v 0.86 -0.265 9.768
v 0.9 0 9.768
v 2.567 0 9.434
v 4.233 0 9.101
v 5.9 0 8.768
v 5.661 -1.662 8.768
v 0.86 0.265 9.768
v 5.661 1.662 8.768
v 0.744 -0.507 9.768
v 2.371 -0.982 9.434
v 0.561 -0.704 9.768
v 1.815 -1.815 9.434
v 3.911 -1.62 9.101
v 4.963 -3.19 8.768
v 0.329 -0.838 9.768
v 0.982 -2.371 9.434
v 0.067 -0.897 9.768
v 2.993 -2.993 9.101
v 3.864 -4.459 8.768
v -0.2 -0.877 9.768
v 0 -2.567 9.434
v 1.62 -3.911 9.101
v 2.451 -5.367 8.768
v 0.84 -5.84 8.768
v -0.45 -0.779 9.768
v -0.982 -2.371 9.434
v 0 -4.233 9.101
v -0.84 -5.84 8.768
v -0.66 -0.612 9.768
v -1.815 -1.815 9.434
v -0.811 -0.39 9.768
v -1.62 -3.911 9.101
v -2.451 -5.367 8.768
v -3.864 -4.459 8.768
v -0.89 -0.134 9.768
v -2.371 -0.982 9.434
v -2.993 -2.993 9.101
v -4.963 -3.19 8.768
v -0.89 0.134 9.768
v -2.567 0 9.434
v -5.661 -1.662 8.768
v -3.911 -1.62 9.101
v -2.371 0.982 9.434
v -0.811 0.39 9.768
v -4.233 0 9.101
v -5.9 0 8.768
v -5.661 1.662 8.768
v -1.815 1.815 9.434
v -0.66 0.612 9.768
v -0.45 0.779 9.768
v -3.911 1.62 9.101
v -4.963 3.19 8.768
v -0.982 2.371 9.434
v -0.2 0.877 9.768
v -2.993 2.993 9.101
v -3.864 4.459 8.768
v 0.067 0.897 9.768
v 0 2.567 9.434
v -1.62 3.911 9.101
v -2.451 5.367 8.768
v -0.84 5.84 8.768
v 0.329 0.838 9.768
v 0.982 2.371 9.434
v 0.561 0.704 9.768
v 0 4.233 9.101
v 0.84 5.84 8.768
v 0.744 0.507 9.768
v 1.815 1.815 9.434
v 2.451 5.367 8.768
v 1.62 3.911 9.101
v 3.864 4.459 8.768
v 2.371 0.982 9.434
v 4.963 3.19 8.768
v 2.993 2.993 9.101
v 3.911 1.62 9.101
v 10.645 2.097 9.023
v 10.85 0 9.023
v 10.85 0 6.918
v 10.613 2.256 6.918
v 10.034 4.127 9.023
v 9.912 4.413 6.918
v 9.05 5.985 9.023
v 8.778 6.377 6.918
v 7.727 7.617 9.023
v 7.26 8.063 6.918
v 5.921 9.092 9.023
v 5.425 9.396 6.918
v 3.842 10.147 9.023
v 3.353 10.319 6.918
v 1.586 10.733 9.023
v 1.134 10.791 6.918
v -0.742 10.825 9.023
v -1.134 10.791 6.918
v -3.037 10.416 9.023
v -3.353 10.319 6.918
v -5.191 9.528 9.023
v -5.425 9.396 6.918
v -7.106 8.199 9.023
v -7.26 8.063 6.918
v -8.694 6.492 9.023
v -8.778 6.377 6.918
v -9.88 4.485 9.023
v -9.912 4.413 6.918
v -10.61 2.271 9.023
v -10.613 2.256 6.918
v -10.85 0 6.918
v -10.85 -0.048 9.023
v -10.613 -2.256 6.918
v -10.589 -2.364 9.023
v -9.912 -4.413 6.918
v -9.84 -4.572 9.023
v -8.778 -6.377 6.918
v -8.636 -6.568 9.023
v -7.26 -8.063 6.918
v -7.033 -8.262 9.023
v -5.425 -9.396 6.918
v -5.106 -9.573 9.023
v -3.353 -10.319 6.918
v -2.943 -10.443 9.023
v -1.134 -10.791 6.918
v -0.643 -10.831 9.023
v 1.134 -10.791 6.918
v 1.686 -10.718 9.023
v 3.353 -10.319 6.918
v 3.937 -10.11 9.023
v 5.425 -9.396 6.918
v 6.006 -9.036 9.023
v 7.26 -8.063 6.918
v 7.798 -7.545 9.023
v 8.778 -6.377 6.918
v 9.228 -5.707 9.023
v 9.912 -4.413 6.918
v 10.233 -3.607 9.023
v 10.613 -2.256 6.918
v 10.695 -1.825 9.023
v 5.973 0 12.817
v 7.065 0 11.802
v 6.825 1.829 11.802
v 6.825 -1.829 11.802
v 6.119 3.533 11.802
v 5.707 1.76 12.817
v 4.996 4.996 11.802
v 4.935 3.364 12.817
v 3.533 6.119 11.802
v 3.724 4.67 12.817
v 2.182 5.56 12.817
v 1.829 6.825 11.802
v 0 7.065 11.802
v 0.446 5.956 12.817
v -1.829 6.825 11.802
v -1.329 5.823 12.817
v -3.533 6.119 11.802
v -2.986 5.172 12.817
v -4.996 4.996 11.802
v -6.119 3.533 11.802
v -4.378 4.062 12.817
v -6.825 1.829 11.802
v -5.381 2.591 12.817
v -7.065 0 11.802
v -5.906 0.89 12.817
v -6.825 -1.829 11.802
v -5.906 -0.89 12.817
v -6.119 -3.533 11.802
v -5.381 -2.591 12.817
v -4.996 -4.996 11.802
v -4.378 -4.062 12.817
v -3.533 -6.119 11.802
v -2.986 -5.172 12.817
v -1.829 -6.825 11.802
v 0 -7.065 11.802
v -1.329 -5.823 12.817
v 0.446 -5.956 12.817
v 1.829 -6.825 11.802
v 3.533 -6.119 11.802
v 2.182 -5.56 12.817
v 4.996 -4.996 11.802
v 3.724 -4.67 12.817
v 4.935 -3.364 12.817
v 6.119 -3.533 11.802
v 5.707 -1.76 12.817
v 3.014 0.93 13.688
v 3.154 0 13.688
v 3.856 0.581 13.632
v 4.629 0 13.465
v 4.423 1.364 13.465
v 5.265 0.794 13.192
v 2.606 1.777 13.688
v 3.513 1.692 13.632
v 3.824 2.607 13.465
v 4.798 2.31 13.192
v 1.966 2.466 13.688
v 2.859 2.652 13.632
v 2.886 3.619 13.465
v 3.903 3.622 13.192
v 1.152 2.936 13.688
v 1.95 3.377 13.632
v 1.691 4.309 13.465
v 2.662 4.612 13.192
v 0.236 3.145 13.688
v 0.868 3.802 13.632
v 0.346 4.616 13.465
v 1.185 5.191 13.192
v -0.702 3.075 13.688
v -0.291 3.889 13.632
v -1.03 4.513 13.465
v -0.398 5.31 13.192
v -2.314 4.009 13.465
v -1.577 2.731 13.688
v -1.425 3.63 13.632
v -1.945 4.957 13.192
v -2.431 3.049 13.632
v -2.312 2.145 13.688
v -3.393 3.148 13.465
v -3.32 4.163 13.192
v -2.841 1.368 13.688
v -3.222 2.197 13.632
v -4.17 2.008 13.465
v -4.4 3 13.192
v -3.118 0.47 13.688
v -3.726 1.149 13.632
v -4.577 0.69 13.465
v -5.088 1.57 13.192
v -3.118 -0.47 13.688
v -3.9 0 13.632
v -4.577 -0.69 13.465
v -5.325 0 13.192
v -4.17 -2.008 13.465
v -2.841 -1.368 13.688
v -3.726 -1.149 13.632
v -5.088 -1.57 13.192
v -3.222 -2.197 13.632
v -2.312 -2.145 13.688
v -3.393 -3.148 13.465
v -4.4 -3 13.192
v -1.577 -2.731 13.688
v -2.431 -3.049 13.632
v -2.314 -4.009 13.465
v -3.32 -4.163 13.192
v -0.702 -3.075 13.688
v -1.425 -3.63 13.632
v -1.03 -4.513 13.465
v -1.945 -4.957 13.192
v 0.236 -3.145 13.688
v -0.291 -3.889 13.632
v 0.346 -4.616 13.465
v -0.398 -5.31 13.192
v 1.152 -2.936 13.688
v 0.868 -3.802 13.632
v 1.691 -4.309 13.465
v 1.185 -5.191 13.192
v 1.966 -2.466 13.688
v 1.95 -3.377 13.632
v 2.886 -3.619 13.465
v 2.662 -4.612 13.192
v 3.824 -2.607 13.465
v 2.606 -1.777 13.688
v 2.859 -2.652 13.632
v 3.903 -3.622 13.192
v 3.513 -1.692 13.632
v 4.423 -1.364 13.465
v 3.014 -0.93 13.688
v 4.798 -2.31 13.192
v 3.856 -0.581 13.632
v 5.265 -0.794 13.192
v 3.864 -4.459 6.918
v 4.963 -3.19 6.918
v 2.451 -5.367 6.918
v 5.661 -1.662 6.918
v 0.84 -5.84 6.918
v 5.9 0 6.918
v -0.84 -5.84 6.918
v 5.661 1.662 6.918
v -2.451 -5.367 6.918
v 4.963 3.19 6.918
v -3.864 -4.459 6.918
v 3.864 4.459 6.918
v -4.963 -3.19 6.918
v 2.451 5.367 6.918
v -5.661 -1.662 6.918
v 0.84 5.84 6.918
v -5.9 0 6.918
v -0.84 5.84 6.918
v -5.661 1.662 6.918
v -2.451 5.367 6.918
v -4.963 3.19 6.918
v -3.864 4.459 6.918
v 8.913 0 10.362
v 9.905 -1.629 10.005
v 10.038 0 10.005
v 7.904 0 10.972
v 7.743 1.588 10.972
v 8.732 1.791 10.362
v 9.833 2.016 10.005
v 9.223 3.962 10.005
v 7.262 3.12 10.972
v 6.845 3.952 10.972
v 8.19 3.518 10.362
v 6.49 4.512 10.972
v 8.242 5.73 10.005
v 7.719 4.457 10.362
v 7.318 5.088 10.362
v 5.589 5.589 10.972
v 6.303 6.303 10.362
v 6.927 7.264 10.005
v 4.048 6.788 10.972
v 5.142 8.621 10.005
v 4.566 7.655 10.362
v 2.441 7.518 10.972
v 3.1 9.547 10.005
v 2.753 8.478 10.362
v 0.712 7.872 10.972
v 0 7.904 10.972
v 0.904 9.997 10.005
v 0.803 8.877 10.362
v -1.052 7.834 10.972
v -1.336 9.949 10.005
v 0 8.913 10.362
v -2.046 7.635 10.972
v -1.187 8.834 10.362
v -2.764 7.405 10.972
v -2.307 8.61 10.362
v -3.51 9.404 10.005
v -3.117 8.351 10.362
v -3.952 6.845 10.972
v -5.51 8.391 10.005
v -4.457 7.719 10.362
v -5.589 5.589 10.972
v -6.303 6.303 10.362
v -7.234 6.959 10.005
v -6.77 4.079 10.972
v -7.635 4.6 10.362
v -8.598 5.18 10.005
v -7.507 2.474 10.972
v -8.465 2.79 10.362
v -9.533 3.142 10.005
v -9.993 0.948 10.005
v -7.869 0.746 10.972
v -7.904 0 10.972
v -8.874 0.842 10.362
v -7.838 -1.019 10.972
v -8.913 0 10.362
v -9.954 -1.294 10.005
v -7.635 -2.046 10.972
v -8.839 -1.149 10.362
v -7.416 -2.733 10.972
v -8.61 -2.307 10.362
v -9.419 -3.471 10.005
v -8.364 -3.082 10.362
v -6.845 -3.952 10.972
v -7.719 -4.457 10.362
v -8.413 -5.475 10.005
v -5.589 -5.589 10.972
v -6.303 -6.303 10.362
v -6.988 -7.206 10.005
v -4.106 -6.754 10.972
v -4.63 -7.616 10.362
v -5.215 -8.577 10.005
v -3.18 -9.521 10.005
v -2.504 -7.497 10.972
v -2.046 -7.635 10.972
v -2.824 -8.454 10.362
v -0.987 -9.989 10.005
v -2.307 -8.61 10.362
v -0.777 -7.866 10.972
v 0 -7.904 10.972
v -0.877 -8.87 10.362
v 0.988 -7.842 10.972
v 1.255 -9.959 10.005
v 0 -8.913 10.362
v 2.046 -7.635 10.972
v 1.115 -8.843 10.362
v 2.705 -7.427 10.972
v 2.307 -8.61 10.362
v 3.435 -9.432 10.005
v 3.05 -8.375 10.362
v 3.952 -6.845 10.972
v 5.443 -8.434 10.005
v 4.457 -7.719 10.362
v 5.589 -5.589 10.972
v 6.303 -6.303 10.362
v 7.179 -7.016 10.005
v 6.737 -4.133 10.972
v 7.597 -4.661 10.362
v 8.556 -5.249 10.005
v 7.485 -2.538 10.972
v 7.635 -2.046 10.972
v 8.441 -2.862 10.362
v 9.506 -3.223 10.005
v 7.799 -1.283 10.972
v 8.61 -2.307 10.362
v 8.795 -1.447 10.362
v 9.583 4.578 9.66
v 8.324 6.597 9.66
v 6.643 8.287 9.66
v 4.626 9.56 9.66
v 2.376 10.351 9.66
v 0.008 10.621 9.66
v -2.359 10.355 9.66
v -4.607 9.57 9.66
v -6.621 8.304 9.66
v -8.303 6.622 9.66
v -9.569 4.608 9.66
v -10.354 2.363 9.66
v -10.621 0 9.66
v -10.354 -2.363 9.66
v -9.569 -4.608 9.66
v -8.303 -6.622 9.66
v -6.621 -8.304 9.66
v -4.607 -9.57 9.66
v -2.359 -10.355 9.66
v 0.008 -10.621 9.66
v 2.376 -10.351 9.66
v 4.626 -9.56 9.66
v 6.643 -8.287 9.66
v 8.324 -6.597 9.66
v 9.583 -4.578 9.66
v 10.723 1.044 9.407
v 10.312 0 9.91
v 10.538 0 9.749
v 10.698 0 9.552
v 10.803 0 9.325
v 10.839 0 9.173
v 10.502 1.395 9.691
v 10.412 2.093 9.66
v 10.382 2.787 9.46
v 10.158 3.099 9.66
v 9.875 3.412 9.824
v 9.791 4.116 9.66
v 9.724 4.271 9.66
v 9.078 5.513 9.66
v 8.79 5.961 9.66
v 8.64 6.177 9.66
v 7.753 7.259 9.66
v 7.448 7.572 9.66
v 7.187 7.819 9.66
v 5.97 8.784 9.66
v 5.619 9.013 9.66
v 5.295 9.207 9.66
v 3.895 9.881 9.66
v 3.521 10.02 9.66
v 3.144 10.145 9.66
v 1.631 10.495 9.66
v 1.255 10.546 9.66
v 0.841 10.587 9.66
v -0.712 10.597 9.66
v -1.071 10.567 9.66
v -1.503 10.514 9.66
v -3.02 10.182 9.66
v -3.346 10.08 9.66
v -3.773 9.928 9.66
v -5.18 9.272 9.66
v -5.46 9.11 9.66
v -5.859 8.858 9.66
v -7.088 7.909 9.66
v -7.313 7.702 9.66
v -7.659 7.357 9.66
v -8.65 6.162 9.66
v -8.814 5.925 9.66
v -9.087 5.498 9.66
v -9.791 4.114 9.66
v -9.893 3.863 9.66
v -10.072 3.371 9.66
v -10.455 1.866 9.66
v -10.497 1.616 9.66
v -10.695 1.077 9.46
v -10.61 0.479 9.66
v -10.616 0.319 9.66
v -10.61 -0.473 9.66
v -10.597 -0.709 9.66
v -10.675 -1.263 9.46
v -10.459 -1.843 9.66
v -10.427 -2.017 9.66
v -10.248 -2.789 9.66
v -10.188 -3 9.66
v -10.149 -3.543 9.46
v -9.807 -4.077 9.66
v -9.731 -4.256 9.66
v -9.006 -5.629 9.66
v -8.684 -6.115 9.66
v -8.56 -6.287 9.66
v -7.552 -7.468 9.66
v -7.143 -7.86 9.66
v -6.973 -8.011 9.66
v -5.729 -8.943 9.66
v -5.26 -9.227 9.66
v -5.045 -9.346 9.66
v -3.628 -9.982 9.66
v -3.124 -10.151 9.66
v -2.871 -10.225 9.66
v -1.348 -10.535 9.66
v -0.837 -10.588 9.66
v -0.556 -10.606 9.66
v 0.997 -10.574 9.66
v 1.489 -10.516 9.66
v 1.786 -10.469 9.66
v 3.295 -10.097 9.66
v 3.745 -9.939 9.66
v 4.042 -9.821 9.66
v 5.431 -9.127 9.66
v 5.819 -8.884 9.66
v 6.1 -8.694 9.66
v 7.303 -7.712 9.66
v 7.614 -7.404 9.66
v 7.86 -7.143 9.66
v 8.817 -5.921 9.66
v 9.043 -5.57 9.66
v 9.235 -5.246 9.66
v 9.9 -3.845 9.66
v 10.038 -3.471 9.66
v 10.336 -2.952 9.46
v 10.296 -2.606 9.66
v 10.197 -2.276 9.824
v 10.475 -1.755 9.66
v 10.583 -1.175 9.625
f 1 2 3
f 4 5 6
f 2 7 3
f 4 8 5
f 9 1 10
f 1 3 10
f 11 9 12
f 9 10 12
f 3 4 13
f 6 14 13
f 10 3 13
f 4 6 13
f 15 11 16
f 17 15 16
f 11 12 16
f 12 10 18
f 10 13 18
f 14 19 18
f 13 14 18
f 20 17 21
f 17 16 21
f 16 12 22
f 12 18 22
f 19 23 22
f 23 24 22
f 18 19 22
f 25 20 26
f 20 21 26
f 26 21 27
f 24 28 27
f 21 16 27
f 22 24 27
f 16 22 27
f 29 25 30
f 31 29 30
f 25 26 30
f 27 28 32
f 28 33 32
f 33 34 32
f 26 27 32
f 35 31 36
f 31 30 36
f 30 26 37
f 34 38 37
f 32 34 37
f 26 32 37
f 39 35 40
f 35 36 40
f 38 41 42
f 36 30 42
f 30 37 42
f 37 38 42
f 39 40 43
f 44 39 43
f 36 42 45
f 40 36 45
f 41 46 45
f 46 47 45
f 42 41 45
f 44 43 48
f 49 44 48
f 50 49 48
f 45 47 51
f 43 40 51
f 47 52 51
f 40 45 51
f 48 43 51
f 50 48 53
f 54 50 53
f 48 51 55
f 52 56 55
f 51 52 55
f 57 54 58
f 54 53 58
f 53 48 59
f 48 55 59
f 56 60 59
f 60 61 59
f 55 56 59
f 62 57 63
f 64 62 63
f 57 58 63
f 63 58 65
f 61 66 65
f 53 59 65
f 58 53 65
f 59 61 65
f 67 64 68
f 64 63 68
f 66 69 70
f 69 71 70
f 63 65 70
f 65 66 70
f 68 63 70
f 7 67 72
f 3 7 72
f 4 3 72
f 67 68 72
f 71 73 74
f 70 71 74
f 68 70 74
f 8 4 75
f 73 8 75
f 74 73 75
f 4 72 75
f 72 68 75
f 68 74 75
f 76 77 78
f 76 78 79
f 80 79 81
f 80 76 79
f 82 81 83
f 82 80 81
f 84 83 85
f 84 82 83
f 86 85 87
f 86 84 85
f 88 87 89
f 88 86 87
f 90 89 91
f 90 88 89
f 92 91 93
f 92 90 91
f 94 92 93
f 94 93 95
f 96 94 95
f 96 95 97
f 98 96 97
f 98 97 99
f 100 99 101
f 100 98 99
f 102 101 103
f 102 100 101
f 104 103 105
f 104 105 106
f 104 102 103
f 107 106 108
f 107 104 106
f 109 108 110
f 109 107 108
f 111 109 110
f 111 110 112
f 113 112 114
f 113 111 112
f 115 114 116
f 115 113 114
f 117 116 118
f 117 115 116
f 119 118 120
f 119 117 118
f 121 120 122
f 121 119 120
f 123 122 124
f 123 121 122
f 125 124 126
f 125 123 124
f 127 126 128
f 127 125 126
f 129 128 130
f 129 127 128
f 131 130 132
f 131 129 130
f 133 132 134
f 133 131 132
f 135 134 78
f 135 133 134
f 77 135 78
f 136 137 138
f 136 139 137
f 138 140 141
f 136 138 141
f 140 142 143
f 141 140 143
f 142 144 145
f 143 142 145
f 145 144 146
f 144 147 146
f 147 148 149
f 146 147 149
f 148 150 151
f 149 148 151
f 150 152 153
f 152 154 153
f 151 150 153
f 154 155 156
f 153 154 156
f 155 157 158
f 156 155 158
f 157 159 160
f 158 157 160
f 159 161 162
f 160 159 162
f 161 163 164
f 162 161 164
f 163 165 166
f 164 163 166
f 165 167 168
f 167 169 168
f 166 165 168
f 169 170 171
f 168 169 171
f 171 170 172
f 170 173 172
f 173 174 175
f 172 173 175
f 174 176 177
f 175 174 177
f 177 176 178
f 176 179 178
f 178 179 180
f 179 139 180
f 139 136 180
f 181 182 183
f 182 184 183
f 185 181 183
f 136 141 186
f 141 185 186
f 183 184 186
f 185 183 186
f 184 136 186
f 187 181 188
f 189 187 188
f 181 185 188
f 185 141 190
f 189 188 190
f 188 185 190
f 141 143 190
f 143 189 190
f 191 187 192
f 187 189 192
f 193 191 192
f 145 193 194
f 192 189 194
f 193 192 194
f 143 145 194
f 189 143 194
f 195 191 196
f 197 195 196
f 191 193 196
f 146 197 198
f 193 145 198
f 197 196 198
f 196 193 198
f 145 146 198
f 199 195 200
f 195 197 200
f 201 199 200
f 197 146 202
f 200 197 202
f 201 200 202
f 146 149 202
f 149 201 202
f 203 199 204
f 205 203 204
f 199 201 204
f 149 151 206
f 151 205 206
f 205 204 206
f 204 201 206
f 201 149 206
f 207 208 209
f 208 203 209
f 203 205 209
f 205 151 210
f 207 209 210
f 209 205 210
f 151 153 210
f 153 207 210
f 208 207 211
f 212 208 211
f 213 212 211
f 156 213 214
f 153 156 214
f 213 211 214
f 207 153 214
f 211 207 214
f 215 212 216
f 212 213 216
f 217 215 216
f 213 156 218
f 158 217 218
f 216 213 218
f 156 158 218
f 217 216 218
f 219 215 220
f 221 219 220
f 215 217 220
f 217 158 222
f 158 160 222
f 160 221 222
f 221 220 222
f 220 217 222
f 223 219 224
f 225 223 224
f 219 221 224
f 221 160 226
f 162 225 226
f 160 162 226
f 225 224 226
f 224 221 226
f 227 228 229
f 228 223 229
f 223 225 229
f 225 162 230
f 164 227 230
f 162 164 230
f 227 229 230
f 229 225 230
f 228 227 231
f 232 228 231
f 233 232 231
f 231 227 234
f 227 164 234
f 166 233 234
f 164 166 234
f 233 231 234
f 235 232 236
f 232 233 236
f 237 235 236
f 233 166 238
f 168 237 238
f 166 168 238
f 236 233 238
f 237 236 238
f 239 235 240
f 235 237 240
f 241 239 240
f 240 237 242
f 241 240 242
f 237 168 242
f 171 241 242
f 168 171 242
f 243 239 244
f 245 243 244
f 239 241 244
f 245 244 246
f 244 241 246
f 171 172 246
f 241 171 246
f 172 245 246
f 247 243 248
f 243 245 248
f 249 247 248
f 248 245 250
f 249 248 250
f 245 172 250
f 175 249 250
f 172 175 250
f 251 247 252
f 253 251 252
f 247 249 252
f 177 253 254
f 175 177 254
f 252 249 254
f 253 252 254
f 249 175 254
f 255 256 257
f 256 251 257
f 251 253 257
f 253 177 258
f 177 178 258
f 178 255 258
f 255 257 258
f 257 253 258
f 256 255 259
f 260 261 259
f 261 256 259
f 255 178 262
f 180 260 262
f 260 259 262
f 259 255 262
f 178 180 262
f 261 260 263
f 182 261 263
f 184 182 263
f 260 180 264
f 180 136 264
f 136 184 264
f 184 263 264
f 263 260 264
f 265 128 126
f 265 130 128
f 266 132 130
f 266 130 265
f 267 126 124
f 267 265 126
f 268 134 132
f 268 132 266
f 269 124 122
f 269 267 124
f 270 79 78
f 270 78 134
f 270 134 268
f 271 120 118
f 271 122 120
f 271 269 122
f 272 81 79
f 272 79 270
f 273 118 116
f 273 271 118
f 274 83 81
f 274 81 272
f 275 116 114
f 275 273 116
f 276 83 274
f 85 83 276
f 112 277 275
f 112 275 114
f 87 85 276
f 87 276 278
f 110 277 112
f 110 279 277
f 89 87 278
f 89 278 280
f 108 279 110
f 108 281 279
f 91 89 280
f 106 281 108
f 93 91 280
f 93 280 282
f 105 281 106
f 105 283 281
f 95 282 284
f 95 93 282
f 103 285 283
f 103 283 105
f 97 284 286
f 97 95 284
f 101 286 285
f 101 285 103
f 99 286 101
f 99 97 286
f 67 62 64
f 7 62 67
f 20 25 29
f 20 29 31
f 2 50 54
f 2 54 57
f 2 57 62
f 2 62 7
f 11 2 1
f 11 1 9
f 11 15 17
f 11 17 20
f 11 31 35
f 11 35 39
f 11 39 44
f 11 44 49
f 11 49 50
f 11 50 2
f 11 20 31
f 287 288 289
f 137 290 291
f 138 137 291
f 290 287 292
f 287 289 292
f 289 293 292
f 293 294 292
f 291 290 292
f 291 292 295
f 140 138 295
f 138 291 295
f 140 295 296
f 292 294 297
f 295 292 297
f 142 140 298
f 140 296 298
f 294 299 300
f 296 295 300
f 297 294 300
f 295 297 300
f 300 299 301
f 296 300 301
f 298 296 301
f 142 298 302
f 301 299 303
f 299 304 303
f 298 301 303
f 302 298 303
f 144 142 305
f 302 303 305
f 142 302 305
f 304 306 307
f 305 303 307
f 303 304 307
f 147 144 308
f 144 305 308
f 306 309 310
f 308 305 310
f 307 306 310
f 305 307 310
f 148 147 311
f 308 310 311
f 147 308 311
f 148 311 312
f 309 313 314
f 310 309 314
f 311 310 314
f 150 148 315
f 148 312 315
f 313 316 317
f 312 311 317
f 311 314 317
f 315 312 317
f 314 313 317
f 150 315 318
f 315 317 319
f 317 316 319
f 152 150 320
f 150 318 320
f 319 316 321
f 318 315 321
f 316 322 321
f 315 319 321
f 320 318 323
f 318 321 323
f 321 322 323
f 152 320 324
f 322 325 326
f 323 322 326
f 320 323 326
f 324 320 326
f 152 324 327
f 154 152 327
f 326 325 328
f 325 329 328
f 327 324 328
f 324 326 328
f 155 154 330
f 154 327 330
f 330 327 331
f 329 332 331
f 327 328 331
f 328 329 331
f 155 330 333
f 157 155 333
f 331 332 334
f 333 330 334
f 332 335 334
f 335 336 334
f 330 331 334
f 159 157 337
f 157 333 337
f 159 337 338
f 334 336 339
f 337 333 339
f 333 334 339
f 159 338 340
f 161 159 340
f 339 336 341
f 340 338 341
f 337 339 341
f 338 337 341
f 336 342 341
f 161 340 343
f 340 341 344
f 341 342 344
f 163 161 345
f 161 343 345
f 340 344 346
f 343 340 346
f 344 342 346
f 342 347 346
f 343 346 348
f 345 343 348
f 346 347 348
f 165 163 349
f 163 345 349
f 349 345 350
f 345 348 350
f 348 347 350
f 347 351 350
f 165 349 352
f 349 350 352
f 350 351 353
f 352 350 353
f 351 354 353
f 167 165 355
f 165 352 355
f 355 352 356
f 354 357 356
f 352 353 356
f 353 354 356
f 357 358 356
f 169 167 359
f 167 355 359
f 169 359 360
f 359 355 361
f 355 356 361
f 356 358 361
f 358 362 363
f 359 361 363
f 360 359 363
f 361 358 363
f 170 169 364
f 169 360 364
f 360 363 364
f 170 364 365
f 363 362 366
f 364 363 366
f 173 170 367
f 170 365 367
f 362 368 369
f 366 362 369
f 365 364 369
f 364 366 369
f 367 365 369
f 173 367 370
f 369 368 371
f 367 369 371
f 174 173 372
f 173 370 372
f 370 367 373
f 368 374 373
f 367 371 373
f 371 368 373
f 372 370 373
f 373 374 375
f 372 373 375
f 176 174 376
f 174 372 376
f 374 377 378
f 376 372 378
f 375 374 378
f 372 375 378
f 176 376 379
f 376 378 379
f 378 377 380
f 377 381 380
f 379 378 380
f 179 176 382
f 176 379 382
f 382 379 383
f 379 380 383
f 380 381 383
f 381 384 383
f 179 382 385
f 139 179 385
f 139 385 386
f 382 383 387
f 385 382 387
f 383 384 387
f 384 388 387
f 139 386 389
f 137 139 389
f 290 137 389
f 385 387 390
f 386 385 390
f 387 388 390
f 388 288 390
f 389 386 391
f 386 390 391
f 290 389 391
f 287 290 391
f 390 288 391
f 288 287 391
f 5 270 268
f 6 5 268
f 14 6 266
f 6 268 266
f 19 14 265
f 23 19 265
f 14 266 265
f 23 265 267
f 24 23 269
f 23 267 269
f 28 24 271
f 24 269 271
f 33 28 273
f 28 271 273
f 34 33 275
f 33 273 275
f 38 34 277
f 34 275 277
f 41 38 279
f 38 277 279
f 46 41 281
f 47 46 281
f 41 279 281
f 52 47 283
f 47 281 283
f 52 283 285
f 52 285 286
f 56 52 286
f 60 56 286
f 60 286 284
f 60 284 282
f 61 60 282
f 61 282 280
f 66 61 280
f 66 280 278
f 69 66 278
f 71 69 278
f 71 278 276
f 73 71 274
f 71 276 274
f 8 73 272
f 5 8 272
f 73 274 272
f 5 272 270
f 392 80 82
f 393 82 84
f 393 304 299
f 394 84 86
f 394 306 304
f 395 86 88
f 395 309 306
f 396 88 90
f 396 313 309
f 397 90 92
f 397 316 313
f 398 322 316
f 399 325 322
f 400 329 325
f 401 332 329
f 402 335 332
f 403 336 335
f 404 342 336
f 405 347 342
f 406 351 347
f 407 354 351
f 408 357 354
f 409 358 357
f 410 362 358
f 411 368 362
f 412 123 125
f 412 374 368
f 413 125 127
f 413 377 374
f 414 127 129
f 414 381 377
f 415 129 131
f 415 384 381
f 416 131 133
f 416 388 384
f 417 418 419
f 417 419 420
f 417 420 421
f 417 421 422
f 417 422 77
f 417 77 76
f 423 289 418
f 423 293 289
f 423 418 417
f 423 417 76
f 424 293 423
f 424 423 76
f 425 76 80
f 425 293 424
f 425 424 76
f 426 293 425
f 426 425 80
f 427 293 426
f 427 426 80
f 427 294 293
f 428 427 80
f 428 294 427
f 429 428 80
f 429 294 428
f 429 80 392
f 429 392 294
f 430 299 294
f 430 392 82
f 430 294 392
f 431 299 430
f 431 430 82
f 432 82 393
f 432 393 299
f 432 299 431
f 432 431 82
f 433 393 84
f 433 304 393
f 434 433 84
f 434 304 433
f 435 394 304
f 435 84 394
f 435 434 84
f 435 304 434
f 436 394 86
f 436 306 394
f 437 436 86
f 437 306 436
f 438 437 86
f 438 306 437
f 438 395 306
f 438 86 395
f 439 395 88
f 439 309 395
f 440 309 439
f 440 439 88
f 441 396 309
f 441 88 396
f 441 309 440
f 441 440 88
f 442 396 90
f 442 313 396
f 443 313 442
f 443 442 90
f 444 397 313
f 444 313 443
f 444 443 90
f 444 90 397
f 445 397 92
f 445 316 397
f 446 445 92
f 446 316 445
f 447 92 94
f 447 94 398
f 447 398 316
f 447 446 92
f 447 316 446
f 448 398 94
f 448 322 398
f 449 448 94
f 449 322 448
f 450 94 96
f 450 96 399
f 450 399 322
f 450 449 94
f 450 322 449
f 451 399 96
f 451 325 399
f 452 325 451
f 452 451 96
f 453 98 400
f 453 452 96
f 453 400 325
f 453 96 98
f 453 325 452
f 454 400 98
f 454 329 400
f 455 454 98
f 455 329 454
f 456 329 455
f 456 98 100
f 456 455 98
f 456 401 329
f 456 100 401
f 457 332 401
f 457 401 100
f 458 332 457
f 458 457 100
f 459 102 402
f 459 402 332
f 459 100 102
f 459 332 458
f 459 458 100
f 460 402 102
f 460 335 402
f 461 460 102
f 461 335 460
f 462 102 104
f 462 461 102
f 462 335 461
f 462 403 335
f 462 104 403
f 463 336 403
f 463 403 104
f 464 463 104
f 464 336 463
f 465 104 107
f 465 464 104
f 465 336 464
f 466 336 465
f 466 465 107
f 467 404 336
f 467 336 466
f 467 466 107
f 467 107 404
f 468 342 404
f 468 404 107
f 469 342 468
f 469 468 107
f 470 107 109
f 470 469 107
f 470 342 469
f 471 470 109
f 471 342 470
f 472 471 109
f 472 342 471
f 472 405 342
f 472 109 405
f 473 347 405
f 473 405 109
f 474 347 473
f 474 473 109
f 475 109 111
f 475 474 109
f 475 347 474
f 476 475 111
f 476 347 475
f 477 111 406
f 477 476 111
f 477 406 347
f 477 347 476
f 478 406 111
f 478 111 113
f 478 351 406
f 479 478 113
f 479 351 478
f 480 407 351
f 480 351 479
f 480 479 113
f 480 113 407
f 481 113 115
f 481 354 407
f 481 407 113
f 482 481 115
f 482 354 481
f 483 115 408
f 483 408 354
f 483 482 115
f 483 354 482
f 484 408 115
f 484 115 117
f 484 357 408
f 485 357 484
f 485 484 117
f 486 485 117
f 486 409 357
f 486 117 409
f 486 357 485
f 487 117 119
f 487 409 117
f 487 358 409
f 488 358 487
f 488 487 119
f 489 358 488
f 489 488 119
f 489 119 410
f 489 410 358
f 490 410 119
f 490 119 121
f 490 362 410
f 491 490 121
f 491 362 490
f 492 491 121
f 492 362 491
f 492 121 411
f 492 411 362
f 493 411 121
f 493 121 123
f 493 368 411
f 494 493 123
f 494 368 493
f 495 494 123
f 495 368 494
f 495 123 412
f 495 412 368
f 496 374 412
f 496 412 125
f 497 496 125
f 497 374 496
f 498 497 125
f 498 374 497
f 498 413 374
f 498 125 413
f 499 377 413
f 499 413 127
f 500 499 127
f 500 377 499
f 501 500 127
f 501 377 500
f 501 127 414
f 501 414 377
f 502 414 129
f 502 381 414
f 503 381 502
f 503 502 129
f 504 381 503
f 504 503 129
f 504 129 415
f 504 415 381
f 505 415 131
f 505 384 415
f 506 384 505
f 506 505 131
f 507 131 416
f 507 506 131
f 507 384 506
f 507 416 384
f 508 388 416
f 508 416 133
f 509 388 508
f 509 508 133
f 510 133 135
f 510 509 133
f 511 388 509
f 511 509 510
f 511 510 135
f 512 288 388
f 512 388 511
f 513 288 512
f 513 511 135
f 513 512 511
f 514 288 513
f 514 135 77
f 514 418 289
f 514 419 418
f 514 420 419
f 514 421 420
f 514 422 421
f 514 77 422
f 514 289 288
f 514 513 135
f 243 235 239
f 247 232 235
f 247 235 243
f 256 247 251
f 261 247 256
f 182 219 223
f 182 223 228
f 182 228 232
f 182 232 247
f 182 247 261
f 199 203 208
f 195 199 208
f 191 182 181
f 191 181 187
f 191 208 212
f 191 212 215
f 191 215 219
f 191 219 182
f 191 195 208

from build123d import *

# Parameters (mm, degrees)
F4_R     = 1
F5_R     = 5.9
F6_DEPTH = 2.85
F7_SIZE2 = 1
F7_SIZE  = 5


# Not quite as in the source:
# - a fillet or chamfer that OpenCascade refuses, or shapes differently, is made with other operations: its cross-section is extruded or revolved along the edge and cut away or added


with BuildPart() as f1:
    # F0 (on Front) → F1 (revolve)
    with BuildSketch(Plane.XZ):
        Polygon((8, 13.6877541882), (0, 13.6877541882), (0, 6.9177541882), (10.85, 6.9177541882), (10.85, 9.9177541882), (8, 9.9177541882), align=None)
    revolve(axis=Axis((0, 0, 10.3027541882), (0, 0, 1)))

    # F2: fillet of radius 5 on 1 edges, made by hand

    # F2_s1 → F2_t2 (revolve, cut)
    with BuildSketch(Plane.XZ):
        with BuildLine():
            ThreePointArc((3.1536508586, 13.6877541882), (6.2236671452, 12.6342716403), (8, 9.9177541882))
            Line((8, 9.9177541882), (8, 13.6877541882))
            Line((8, 13.6877541882), (3.1536508586, 13.6877541882))
        make_face()
    revolve(axis=Axis((0, 0, 13.6877541882), (0, 0, 1)), mode=Mode.SUBTRACT)

    # F3: fillet of radius 5 on 1 edges, made by hand

    # F3_s1 → F3_t2 (revolve)
    with BuildSketch(Plane.XZ):
        with BuildLine():
            ThreePointArc((7.0654038886, 11.8019456133), (8.7487622666, 10.4401726424), (10.85, 9.9177541882))
            Line((10.85, 9.9177541882), (8, 9.9177541882))
            ThreePointArc((8, 9.9177541882), (7.6328955207, 10.9095478909), (7.0654038886, 11.8019456133))
        make_face()
    revolve(axis=Axis((0, 0, 9.9177541882), (0, 0, 1)))

    # F4
    f4_edges = [f1.edges().sort_by_distance(p)[0] for p in [
        (-10.85, 0, 9.917754),
    ]]
    fillet(f4_edges, radius=F4_R)

    # F5 (on face) → F6 (cut)
    with BuildSketch(Plane(origin=(0, 0, 6.9177541882), x_dir=(1, 0, 0), z_dir=(0, 0, -1))):
        Circle(F5_R)
    extrude(amount=-F6_DEPTH, mode=Mode.SUBTRACT)

    # F7
    f7_edges = [f1.edges().sort_by_distance(p)[0] for p in [
        (-5.9, 0, 9.767754),
    ]]
    f7_side = f1.faces().sort_by_distance((0, 0, 9.767754))[0]
    chamfer(f7_edges, length=F7_SIZE, length2=F7_SIZE2, reference=f7_side)


solid = f1.part
